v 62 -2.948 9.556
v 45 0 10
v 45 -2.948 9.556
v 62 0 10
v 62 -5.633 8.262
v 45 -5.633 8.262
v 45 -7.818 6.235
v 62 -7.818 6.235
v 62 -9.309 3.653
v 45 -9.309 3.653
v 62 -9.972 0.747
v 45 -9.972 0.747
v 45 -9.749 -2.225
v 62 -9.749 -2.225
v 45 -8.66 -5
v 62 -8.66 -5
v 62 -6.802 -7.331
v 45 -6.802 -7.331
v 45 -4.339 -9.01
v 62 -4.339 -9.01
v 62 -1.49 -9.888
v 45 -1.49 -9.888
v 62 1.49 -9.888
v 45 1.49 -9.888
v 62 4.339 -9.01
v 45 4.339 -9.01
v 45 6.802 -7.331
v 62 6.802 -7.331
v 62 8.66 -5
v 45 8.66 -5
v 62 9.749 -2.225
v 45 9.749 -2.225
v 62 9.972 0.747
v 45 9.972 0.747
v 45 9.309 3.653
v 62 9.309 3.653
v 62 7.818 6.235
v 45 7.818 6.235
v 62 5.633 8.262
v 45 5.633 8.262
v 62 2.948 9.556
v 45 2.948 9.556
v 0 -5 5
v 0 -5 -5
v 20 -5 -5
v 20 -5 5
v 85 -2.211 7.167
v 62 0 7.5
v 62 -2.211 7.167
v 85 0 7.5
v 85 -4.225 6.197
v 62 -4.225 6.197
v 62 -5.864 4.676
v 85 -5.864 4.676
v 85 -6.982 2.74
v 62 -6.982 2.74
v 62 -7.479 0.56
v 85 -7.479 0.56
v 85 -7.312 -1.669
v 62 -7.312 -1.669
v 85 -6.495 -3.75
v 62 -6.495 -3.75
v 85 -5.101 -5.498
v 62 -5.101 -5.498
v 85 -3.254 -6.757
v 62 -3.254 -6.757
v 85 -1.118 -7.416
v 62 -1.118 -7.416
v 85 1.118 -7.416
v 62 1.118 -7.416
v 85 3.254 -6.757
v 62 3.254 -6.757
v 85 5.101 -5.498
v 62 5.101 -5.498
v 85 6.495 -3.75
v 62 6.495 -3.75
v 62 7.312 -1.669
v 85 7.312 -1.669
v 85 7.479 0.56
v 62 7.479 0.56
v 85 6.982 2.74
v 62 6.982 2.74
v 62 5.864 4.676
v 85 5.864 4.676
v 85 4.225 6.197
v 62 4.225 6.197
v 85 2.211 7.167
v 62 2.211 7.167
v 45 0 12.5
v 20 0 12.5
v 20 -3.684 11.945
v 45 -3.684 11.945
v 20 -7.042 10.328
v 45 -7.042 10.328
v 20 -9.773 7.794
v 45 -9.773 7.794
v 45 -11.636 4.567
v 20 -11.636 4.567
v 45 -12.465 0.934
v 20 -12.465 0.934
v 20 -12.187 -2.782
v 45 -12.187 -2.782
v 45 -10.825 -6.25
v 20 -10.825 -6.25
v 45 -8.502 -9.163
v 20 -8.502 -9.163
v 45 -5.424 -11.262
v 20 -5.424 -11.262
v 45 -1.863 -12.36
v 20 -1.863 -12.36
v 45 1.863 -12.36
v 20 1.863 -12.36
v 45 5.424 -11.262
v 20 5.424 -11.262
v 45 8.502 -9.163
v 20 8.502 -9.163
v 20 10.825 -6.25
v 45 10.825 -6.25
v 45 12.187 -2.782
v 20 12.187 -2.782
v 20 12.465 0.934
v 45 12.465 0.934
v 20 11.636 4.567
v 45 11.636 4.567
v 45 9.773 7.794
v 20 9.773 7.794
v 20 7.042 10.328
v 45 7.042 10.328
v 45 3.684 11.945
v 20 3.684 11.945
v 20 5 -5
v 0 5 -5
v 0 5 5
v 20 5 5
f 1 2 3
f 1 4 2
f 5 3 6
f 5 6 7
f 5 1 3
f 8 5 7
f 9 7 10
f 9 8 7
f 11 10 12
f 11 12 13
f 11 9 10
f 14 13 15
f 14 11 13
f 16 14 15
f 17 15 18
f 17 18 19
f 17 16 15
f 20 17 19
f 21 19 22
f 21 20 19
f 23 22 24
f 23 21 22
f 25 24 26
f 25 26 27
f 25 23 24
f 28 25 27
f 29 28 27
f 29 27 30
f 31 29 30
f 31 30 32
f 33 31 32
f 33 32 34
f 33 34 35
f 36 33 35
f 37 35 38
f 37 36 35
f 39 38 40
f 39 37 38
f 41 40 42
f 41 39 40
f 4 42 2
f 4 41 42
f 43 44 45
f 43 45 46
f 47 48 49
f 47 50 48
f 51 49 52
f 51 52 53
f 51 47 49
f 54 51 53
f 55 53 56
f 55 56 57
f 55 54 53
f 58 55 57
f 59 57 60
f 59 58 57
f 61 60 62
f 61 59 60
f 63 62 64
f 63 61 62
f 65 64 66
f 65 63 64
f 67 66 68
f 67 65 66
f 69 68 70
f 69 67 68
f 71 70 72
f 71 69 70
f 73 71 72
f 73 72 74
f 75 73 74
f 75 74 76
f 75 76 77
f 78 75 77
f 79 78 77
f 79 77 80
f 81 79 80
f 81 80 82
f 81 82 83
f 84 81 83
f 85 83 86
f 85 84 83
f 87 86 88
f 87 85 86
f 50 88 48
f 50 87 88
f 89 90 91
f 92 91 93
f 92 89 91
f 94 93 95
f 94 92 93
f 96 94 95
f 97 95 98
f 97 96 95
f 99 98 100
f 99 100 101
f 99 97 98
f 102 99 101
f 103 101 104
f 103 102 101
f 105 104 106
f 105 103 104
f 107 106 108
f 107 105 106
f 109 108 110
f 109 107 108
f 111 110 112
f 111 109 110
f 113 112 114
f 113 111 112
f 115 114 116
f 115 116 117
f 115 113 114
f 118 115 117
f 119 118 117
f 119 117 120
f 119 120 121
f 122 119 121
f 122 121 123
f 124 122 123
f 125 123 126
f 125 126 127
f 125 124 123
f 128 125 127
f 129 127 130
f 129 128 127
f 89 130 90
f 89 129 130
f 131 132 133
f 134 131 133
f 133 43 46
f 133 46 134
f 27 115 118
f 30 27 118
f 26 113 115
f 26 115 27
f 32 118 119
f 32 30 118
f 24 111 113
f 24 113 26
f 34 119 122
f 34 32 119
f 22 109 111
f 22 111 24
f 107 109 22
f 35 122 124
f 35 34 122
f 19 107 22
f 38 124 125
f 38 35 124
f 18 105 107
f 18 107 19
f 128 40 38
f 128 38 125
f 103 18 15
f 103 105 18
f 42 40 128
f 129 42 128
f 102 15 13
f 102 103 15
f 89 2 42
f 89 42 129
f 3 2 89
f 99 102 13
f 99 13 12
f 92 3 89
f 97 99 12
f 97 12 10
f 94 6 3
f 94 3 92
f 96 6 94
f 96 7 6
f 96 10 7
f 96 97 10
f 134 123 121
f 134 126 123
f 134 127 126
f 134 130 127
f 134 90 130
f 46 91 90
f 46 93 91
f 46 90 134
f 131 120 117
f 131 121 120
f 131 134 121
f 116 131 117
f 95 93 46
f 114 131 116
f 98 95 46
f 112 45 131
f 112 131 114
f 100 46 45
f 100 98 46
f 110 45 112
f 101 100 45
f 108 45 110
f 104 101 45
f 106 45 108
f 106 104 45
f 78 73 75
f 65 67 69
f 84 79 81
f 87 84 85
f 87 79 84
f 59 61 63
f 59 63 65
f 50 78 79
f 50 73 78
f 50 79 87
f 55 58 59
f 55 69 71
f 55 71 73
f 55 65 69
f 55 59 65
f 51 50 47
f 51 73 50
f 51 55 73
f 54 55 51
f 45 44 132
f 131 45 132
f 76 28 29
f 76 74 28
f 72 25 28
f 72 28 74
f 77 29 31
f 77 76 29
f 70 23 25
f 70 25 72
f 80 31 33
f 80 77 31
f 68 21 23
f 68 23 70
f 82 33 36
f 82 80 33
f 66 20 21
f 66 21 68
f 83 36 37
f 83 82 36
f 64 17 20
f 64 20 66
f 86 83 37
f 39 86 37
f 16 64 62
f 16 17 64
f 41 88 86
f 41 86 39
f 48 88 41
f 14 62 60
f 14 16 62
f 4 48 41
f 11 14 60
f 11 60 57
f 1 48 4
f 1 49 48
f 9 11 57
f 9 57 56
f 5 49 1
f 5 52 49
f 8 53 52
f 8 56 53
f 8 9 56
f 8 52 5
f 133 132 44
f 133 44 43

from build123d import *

# Parameters (mm, degrees)
SKETCH_3_W      = 10
SKETCH_3_H      = 10
EXTRUDE_1_DEPTH = 20


with BuildPart() as part:
    # Эскиз2 → Повернуть1 (revolve)
    with BuildSketch(Plane.XY, mode=Mode.PRIVATE) as revolve_1_sk:
        Polygon((0, 0), (0, 5), (20, 5), (20, 12.5), (45, 12.5), (45, 10), (62, 10), (62, 7.5), (85, 7.5), (85, 0), align=None)
    revolve(revolve_1_sk.sketch.rotate(Axis((0, 0, 0), (1, 0, 0)), 90), axis=Axis((0, 0, 0), (1, 0, 0)))

    # Эскиз3 → Бобышка-Вытянуть1 (add)
    with BuildSketch(Plane.ZY):
        Rectangle(SKETCH_3_W, SKETCH_3_H)
    extrude(amount=-EXTRUDE_1_DEPTH)


solid = part.part
